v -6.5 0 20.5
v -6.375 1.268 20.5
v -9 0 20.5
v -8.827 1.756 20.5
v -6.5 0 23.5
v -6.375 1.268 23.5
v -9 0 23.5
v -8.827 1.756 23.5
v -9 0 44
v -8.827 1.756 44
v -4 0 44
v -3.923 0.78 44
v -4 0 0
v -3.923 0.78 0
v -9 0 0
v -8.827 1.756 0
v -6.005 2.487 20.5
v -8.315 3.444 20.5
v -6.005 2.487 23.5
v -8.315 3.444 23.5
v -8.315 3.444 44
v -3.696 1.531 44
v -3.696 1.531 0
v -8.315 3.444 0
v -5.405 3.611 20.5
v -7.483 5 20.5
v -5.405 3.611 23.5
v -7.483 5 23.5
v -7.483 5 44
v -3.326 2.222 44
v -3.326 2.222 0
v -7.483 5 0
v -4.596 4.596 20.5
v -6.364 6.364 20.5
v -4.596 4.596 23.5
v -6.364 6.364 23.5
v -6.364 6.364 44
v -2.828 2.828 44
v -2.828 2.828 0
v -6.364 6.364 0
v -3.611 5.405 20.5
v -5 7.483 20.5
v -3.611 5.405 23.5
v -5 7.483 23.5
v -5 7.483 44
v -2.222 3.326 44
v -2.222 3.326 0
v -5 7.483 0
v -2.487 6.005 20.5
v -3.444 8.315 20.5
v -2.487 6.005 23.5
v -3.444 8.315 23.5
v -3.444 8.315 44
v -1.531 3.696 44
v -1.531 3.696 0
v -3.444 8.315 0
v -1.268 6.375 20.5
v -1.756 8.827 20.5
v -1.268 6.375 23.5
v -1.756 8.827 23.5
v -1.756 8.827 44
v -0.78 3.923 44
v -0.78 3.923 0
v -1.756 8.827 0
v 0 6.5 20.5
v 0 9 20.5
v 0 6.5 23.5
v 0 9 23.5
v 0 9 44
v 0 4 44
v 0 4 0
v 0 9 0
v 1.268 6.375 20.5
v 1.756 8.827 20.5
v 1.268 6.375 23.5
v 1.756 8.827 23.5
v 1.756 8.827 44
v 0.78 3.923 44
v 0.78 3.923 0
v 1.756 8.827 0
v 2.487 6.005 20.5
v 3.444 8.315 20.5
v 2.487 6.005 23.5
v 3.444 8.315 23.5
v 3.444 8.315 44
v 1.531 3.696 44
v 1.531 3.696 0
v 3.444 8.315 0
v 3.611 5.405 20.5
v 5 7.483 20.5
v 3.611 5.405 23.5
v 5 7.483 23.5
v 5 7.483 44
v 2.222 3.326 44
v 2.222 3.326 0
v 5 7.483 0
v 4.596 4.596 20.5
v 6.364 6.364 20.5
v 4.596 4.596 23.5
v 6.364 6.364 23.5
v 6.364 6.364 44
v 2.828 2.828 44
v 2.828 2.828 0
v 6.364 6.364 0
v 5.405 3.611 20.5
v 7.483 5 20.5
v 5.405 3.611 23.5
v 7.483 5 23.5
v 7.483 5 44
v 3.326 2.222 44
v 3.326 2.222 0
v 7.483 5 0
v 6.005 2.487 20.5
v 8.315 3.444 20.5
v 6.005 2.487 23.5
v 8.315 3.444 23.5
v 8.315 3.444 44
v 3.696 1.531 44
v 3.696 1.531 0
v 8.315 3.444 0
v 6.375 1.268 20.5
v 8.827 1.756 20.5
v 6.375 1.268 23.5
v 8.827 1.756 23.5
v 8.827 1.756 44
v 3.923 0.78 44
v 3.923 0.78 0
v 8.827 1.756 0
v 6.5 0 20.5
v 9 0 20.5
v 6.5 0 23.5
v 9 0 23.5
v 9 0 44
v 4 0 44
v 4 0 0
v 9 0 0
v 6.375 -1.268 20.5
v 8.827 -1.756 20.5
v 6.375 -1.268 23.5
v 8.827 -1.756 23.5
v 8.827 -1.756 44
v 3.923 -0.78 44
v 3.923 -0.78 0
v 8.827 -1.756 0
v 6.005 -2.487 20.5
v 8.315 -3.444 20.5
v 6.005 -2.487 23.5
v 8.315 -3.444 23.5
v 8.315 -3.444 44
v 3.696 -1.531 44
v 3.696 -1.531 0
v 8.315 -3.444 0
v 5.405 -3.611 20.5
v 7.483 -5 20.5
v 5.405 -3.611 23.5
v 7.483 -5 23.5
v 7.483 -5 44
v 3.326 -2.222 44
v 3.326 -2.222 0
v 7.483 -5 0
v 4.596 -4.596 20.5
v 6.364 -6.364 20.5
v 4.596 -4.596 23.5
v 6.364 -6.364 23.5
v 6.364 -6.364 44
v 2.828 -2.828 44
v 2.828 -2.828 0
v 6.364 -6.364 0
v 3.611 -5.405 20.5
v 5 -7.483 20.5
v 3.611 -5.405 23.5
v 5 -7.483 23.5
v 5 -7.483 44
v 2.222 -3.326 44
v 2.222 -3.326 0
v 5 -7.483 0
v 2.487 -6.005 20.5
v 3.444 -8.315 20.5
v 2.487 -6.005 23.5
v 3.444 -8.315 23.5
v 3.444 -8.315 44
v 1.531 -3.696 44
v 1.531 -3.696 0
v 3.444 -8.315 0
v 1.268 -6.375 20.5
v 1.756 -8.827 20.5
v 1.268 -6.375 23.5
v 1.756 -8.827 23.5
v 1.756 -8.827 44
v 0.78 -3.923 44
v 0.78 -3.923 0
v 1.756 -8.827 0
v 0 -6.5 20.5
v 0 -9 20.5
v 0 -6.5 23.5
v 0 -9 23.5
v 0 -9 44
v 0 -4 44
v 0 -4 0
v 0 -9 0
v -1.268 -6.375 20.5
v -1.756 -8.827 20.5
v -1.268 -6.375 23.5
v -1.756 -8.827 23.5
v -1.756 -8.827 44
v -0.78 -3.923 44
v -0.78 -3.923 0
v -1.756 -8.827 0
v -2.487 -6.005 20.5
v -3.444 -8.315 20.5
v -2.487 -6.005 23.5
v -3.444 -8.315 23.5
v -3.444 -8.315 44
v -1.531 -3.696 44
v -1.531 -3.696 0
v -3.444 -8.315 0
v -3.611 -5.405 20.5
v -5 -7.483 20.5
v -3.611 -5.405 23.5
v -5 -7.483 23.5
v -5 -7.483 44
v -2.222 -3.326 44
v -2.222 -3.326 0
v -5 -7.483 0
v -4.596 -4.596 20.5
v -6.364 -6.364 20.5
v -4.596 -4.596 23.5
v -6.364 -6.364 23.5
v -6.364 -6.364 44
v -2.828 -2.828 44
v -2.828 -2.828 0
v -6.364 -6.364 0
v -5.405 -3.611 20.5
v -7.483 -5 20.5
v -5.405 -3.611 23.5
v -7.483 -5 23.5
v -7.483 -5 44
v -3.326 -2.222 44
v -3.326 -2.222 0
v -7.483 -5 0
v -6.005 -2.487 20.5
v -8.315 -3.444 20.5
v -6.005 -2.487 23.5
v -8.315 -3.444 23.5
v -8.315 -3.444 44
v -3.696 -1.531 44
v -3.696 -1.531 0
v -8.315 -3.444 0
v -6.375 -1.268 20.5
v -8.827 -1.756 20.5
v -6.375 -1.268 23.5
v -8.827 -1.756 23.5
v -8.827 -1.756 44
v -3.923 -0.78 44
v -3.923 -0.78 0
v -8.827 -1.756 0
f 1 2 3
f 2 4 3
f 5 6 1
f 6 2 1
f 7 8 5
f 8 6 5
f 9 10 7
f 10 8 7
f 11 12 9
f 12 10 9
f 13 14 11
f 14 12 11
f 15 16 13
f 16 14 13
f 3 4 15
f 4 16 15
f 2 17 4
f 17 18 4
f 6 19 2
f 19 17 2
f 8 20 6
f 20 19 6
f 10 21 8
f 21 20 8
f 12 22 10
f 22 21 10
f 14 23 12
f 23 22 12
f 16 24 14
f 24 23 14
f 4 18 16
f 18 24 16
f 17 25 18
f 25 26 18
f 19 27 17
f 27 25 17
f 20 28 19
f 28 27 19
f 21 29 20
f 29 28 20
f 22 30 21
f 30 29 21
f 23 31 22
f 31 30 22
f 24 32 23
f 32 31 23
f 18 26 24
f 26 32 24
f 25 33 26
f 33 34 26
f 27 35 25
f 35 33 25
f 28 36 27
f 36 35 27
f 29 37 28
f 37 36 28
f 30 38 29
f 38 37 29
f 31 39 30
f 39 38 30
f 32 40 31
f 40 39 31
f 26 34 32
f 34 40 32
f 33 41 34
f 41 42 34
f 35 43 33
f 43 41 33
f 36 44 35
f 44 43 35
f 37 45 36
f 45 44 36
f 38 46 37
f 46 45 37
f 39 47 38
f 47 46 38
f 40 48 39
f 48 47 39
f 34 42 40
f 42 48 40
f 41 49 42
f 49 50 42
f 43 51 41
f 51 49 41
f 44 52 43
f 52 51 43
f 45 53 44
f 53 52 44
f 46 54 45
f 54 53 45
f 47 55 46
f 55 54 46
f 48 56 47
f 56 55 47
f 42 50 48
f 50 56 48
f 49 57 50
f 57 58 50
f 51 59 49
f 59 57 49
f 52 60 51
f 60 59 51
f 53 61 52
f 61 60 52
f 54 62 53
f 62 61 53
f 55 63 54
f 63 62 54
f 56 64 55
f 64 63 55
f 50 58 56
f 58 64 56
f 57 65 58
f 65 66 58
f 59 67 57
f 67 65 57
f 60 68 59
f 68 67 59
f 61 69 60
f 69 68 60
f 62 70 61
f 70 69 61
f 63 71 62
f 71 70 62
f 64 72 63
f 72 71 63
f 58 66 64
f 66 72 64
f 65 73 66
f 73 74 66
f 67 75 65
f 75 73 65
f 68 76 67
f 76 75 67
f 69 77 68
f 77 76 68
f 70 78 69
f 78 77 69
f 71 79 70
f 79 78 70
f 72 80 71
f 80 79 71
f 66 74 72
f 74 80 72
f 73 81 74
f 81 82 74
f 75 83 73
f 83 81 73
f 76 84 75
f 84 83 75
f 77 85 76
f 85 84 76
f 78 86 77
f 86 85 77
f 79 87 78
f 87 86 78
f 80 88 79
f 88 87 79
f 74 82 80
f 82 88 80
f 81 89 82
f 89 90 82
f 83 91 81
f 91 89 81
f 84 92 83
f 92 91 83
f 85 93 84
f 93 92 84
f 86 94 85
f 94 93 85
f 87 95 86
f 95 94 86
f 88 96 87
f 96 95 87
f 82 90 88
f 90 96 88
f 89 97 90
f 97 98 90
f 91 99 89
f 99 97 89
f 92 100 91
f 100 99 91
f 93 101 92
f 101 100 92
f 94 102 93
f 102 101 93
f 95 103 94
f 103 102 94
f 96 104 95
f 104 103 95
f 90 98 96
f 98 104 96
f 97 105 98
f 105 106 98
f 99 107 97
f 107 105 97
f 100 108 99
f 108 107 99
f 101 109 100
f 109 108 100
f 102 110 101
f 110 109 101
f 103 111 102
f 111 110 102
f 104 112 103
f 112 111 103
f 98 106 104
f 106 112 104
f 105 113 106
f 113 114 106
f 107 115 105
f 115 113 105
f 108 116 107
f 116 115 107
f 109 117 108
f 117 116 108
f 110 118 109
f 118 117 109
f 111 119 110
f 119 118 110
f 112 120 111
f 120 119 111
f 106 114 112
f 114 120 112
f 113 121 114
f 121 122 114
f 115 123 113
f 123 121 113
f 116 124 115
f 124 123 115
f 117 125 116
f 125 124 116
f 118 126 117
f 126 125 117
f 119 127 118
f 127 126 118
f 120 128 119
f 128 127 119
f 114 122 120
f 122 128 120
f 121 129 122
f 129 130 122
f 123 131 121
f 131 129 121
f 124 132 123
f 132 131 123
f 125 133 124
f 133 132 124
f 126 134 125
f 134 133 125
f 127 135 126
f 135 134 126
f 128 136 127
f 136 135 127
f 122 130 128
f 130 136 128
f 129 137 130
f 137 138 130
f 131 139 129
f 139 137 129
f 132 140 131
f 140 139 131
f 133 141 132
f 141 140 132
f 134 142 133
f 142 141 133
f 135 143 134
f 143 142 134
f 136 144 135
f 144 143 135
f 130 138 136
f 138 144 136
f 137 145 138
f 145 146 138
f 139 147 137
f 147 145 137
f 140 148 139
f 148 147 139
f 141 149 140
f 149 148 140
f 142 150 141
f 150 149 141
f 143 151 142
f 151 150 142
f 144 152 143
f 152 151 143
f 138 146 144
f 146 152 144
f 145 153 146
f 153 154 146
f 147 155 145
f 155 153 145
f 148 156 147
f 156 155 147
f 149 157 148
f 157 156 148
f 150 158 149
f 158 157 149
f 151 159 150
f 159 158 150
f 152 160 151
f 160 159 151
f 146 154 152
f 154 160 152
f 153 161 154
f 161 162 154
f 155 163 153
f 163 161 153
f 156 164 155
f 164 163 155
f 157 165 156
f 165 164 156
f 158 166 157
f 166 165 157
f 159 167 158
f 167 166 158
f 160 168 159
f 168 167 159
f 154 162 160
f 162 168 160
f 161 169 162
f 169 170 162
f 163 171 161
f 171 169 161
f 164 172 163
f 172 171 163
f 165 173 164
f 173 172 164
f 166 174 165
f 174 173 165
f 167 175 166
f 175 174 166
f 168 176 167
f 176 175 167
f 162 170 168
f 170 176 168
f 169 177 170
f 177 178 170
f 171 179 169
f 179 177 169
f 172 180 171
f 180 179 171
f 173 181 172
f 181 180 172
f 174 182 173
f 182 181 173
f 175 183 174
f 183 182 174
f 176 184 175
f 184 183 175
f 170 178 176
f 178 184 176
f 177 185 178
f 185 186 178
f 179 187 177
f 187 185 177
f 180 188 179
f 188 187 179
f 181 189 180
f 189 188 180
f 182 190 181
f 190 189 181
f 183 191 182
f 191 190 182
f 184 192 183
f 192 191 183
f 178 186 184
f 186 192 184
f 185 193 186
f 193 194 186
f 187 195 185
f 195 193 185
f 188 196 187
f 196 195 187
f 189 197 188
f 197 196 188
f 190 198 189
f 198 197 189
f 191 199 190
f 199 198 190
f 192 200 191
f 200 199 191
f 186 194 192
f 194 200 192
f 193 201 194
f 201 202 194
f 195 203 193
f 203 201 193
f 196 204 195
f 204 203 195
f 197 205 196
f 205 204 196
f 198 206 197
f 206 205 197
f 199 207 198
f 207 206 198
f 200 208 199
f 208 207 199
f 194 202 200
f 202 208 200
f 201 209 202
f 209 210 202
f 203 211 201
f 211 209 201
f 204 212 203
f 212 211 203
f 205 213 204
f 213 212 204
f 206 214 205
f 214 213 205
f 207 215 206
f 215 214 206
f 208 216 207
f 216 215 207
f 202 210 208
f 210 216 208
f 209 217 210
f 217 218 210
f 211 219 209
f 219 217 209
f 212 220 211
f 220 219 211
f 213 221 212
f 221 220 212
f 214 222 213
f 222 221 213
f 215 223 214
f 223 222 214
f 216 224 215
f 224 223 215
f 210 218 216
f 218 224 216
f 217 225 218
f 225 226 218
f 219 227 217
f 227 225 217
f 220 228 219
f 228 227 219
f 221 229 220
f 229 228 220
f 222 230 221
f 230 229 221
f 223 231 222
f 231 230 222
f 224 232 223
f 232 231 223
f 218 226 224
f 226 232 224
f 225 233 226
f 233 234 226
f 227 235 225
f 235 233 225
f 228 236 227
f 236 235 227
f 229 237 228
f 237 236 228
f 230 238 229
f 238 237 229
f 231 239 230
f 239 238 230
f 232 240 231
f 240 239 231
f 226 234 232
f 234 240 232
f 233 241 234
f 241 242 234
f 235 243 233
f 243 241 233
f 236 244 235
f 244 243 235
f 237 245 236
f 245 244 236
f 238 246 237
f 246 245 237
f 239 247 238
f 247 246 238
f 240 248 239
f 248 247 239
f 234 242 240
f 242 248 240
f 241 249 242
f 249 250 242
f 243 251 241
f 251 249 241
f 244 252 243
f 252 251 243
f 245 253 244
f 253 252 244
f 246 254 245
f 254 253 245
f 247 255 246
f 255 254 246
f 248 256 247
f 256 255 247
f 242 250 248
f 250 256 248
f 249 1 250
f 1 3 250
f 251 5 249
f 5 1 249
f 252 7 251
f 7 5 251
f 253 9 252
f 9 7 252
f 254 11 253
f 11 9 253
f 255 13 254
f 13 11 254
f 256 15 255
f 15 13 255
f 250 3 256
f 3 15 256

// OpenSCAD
$fn = 32;

// ----------------------------------------------------------------------
// Grooved revolve: stepped, bore R4
// ----------------------------------------------------------------------

// --- parameters (mm) ---
bore_r = 4;               // bore radius
outer_r = 9;              // outer radius of the body
total_h = 44;             // overall height, Z
wall = 5;                 // radial wall thickness
groove_w = 3;             // groove width
groove_d = 2.5;           // groove depth
grooves = 1;              // number of outer grooves

bbox_x = 2 * outer_r;  // full diameter
bore_d = 2 * bore_r;  // bore diameter
body_d = 2 * outer_r;  // body diameter
revolve_angle = 360;  // full turn around the Z axis

profile = [[4, 0], [9, 0], [9, 20.5], [6.5, 20.5], [6.5, 23.5], [9, 23.5], [9, 44], [4, 44]];  // primary outline, 8 points, counter clockwise

// --- the one profile operation ---
rotate_extrude(angle = revolve_angle) polygon(points = profile);
